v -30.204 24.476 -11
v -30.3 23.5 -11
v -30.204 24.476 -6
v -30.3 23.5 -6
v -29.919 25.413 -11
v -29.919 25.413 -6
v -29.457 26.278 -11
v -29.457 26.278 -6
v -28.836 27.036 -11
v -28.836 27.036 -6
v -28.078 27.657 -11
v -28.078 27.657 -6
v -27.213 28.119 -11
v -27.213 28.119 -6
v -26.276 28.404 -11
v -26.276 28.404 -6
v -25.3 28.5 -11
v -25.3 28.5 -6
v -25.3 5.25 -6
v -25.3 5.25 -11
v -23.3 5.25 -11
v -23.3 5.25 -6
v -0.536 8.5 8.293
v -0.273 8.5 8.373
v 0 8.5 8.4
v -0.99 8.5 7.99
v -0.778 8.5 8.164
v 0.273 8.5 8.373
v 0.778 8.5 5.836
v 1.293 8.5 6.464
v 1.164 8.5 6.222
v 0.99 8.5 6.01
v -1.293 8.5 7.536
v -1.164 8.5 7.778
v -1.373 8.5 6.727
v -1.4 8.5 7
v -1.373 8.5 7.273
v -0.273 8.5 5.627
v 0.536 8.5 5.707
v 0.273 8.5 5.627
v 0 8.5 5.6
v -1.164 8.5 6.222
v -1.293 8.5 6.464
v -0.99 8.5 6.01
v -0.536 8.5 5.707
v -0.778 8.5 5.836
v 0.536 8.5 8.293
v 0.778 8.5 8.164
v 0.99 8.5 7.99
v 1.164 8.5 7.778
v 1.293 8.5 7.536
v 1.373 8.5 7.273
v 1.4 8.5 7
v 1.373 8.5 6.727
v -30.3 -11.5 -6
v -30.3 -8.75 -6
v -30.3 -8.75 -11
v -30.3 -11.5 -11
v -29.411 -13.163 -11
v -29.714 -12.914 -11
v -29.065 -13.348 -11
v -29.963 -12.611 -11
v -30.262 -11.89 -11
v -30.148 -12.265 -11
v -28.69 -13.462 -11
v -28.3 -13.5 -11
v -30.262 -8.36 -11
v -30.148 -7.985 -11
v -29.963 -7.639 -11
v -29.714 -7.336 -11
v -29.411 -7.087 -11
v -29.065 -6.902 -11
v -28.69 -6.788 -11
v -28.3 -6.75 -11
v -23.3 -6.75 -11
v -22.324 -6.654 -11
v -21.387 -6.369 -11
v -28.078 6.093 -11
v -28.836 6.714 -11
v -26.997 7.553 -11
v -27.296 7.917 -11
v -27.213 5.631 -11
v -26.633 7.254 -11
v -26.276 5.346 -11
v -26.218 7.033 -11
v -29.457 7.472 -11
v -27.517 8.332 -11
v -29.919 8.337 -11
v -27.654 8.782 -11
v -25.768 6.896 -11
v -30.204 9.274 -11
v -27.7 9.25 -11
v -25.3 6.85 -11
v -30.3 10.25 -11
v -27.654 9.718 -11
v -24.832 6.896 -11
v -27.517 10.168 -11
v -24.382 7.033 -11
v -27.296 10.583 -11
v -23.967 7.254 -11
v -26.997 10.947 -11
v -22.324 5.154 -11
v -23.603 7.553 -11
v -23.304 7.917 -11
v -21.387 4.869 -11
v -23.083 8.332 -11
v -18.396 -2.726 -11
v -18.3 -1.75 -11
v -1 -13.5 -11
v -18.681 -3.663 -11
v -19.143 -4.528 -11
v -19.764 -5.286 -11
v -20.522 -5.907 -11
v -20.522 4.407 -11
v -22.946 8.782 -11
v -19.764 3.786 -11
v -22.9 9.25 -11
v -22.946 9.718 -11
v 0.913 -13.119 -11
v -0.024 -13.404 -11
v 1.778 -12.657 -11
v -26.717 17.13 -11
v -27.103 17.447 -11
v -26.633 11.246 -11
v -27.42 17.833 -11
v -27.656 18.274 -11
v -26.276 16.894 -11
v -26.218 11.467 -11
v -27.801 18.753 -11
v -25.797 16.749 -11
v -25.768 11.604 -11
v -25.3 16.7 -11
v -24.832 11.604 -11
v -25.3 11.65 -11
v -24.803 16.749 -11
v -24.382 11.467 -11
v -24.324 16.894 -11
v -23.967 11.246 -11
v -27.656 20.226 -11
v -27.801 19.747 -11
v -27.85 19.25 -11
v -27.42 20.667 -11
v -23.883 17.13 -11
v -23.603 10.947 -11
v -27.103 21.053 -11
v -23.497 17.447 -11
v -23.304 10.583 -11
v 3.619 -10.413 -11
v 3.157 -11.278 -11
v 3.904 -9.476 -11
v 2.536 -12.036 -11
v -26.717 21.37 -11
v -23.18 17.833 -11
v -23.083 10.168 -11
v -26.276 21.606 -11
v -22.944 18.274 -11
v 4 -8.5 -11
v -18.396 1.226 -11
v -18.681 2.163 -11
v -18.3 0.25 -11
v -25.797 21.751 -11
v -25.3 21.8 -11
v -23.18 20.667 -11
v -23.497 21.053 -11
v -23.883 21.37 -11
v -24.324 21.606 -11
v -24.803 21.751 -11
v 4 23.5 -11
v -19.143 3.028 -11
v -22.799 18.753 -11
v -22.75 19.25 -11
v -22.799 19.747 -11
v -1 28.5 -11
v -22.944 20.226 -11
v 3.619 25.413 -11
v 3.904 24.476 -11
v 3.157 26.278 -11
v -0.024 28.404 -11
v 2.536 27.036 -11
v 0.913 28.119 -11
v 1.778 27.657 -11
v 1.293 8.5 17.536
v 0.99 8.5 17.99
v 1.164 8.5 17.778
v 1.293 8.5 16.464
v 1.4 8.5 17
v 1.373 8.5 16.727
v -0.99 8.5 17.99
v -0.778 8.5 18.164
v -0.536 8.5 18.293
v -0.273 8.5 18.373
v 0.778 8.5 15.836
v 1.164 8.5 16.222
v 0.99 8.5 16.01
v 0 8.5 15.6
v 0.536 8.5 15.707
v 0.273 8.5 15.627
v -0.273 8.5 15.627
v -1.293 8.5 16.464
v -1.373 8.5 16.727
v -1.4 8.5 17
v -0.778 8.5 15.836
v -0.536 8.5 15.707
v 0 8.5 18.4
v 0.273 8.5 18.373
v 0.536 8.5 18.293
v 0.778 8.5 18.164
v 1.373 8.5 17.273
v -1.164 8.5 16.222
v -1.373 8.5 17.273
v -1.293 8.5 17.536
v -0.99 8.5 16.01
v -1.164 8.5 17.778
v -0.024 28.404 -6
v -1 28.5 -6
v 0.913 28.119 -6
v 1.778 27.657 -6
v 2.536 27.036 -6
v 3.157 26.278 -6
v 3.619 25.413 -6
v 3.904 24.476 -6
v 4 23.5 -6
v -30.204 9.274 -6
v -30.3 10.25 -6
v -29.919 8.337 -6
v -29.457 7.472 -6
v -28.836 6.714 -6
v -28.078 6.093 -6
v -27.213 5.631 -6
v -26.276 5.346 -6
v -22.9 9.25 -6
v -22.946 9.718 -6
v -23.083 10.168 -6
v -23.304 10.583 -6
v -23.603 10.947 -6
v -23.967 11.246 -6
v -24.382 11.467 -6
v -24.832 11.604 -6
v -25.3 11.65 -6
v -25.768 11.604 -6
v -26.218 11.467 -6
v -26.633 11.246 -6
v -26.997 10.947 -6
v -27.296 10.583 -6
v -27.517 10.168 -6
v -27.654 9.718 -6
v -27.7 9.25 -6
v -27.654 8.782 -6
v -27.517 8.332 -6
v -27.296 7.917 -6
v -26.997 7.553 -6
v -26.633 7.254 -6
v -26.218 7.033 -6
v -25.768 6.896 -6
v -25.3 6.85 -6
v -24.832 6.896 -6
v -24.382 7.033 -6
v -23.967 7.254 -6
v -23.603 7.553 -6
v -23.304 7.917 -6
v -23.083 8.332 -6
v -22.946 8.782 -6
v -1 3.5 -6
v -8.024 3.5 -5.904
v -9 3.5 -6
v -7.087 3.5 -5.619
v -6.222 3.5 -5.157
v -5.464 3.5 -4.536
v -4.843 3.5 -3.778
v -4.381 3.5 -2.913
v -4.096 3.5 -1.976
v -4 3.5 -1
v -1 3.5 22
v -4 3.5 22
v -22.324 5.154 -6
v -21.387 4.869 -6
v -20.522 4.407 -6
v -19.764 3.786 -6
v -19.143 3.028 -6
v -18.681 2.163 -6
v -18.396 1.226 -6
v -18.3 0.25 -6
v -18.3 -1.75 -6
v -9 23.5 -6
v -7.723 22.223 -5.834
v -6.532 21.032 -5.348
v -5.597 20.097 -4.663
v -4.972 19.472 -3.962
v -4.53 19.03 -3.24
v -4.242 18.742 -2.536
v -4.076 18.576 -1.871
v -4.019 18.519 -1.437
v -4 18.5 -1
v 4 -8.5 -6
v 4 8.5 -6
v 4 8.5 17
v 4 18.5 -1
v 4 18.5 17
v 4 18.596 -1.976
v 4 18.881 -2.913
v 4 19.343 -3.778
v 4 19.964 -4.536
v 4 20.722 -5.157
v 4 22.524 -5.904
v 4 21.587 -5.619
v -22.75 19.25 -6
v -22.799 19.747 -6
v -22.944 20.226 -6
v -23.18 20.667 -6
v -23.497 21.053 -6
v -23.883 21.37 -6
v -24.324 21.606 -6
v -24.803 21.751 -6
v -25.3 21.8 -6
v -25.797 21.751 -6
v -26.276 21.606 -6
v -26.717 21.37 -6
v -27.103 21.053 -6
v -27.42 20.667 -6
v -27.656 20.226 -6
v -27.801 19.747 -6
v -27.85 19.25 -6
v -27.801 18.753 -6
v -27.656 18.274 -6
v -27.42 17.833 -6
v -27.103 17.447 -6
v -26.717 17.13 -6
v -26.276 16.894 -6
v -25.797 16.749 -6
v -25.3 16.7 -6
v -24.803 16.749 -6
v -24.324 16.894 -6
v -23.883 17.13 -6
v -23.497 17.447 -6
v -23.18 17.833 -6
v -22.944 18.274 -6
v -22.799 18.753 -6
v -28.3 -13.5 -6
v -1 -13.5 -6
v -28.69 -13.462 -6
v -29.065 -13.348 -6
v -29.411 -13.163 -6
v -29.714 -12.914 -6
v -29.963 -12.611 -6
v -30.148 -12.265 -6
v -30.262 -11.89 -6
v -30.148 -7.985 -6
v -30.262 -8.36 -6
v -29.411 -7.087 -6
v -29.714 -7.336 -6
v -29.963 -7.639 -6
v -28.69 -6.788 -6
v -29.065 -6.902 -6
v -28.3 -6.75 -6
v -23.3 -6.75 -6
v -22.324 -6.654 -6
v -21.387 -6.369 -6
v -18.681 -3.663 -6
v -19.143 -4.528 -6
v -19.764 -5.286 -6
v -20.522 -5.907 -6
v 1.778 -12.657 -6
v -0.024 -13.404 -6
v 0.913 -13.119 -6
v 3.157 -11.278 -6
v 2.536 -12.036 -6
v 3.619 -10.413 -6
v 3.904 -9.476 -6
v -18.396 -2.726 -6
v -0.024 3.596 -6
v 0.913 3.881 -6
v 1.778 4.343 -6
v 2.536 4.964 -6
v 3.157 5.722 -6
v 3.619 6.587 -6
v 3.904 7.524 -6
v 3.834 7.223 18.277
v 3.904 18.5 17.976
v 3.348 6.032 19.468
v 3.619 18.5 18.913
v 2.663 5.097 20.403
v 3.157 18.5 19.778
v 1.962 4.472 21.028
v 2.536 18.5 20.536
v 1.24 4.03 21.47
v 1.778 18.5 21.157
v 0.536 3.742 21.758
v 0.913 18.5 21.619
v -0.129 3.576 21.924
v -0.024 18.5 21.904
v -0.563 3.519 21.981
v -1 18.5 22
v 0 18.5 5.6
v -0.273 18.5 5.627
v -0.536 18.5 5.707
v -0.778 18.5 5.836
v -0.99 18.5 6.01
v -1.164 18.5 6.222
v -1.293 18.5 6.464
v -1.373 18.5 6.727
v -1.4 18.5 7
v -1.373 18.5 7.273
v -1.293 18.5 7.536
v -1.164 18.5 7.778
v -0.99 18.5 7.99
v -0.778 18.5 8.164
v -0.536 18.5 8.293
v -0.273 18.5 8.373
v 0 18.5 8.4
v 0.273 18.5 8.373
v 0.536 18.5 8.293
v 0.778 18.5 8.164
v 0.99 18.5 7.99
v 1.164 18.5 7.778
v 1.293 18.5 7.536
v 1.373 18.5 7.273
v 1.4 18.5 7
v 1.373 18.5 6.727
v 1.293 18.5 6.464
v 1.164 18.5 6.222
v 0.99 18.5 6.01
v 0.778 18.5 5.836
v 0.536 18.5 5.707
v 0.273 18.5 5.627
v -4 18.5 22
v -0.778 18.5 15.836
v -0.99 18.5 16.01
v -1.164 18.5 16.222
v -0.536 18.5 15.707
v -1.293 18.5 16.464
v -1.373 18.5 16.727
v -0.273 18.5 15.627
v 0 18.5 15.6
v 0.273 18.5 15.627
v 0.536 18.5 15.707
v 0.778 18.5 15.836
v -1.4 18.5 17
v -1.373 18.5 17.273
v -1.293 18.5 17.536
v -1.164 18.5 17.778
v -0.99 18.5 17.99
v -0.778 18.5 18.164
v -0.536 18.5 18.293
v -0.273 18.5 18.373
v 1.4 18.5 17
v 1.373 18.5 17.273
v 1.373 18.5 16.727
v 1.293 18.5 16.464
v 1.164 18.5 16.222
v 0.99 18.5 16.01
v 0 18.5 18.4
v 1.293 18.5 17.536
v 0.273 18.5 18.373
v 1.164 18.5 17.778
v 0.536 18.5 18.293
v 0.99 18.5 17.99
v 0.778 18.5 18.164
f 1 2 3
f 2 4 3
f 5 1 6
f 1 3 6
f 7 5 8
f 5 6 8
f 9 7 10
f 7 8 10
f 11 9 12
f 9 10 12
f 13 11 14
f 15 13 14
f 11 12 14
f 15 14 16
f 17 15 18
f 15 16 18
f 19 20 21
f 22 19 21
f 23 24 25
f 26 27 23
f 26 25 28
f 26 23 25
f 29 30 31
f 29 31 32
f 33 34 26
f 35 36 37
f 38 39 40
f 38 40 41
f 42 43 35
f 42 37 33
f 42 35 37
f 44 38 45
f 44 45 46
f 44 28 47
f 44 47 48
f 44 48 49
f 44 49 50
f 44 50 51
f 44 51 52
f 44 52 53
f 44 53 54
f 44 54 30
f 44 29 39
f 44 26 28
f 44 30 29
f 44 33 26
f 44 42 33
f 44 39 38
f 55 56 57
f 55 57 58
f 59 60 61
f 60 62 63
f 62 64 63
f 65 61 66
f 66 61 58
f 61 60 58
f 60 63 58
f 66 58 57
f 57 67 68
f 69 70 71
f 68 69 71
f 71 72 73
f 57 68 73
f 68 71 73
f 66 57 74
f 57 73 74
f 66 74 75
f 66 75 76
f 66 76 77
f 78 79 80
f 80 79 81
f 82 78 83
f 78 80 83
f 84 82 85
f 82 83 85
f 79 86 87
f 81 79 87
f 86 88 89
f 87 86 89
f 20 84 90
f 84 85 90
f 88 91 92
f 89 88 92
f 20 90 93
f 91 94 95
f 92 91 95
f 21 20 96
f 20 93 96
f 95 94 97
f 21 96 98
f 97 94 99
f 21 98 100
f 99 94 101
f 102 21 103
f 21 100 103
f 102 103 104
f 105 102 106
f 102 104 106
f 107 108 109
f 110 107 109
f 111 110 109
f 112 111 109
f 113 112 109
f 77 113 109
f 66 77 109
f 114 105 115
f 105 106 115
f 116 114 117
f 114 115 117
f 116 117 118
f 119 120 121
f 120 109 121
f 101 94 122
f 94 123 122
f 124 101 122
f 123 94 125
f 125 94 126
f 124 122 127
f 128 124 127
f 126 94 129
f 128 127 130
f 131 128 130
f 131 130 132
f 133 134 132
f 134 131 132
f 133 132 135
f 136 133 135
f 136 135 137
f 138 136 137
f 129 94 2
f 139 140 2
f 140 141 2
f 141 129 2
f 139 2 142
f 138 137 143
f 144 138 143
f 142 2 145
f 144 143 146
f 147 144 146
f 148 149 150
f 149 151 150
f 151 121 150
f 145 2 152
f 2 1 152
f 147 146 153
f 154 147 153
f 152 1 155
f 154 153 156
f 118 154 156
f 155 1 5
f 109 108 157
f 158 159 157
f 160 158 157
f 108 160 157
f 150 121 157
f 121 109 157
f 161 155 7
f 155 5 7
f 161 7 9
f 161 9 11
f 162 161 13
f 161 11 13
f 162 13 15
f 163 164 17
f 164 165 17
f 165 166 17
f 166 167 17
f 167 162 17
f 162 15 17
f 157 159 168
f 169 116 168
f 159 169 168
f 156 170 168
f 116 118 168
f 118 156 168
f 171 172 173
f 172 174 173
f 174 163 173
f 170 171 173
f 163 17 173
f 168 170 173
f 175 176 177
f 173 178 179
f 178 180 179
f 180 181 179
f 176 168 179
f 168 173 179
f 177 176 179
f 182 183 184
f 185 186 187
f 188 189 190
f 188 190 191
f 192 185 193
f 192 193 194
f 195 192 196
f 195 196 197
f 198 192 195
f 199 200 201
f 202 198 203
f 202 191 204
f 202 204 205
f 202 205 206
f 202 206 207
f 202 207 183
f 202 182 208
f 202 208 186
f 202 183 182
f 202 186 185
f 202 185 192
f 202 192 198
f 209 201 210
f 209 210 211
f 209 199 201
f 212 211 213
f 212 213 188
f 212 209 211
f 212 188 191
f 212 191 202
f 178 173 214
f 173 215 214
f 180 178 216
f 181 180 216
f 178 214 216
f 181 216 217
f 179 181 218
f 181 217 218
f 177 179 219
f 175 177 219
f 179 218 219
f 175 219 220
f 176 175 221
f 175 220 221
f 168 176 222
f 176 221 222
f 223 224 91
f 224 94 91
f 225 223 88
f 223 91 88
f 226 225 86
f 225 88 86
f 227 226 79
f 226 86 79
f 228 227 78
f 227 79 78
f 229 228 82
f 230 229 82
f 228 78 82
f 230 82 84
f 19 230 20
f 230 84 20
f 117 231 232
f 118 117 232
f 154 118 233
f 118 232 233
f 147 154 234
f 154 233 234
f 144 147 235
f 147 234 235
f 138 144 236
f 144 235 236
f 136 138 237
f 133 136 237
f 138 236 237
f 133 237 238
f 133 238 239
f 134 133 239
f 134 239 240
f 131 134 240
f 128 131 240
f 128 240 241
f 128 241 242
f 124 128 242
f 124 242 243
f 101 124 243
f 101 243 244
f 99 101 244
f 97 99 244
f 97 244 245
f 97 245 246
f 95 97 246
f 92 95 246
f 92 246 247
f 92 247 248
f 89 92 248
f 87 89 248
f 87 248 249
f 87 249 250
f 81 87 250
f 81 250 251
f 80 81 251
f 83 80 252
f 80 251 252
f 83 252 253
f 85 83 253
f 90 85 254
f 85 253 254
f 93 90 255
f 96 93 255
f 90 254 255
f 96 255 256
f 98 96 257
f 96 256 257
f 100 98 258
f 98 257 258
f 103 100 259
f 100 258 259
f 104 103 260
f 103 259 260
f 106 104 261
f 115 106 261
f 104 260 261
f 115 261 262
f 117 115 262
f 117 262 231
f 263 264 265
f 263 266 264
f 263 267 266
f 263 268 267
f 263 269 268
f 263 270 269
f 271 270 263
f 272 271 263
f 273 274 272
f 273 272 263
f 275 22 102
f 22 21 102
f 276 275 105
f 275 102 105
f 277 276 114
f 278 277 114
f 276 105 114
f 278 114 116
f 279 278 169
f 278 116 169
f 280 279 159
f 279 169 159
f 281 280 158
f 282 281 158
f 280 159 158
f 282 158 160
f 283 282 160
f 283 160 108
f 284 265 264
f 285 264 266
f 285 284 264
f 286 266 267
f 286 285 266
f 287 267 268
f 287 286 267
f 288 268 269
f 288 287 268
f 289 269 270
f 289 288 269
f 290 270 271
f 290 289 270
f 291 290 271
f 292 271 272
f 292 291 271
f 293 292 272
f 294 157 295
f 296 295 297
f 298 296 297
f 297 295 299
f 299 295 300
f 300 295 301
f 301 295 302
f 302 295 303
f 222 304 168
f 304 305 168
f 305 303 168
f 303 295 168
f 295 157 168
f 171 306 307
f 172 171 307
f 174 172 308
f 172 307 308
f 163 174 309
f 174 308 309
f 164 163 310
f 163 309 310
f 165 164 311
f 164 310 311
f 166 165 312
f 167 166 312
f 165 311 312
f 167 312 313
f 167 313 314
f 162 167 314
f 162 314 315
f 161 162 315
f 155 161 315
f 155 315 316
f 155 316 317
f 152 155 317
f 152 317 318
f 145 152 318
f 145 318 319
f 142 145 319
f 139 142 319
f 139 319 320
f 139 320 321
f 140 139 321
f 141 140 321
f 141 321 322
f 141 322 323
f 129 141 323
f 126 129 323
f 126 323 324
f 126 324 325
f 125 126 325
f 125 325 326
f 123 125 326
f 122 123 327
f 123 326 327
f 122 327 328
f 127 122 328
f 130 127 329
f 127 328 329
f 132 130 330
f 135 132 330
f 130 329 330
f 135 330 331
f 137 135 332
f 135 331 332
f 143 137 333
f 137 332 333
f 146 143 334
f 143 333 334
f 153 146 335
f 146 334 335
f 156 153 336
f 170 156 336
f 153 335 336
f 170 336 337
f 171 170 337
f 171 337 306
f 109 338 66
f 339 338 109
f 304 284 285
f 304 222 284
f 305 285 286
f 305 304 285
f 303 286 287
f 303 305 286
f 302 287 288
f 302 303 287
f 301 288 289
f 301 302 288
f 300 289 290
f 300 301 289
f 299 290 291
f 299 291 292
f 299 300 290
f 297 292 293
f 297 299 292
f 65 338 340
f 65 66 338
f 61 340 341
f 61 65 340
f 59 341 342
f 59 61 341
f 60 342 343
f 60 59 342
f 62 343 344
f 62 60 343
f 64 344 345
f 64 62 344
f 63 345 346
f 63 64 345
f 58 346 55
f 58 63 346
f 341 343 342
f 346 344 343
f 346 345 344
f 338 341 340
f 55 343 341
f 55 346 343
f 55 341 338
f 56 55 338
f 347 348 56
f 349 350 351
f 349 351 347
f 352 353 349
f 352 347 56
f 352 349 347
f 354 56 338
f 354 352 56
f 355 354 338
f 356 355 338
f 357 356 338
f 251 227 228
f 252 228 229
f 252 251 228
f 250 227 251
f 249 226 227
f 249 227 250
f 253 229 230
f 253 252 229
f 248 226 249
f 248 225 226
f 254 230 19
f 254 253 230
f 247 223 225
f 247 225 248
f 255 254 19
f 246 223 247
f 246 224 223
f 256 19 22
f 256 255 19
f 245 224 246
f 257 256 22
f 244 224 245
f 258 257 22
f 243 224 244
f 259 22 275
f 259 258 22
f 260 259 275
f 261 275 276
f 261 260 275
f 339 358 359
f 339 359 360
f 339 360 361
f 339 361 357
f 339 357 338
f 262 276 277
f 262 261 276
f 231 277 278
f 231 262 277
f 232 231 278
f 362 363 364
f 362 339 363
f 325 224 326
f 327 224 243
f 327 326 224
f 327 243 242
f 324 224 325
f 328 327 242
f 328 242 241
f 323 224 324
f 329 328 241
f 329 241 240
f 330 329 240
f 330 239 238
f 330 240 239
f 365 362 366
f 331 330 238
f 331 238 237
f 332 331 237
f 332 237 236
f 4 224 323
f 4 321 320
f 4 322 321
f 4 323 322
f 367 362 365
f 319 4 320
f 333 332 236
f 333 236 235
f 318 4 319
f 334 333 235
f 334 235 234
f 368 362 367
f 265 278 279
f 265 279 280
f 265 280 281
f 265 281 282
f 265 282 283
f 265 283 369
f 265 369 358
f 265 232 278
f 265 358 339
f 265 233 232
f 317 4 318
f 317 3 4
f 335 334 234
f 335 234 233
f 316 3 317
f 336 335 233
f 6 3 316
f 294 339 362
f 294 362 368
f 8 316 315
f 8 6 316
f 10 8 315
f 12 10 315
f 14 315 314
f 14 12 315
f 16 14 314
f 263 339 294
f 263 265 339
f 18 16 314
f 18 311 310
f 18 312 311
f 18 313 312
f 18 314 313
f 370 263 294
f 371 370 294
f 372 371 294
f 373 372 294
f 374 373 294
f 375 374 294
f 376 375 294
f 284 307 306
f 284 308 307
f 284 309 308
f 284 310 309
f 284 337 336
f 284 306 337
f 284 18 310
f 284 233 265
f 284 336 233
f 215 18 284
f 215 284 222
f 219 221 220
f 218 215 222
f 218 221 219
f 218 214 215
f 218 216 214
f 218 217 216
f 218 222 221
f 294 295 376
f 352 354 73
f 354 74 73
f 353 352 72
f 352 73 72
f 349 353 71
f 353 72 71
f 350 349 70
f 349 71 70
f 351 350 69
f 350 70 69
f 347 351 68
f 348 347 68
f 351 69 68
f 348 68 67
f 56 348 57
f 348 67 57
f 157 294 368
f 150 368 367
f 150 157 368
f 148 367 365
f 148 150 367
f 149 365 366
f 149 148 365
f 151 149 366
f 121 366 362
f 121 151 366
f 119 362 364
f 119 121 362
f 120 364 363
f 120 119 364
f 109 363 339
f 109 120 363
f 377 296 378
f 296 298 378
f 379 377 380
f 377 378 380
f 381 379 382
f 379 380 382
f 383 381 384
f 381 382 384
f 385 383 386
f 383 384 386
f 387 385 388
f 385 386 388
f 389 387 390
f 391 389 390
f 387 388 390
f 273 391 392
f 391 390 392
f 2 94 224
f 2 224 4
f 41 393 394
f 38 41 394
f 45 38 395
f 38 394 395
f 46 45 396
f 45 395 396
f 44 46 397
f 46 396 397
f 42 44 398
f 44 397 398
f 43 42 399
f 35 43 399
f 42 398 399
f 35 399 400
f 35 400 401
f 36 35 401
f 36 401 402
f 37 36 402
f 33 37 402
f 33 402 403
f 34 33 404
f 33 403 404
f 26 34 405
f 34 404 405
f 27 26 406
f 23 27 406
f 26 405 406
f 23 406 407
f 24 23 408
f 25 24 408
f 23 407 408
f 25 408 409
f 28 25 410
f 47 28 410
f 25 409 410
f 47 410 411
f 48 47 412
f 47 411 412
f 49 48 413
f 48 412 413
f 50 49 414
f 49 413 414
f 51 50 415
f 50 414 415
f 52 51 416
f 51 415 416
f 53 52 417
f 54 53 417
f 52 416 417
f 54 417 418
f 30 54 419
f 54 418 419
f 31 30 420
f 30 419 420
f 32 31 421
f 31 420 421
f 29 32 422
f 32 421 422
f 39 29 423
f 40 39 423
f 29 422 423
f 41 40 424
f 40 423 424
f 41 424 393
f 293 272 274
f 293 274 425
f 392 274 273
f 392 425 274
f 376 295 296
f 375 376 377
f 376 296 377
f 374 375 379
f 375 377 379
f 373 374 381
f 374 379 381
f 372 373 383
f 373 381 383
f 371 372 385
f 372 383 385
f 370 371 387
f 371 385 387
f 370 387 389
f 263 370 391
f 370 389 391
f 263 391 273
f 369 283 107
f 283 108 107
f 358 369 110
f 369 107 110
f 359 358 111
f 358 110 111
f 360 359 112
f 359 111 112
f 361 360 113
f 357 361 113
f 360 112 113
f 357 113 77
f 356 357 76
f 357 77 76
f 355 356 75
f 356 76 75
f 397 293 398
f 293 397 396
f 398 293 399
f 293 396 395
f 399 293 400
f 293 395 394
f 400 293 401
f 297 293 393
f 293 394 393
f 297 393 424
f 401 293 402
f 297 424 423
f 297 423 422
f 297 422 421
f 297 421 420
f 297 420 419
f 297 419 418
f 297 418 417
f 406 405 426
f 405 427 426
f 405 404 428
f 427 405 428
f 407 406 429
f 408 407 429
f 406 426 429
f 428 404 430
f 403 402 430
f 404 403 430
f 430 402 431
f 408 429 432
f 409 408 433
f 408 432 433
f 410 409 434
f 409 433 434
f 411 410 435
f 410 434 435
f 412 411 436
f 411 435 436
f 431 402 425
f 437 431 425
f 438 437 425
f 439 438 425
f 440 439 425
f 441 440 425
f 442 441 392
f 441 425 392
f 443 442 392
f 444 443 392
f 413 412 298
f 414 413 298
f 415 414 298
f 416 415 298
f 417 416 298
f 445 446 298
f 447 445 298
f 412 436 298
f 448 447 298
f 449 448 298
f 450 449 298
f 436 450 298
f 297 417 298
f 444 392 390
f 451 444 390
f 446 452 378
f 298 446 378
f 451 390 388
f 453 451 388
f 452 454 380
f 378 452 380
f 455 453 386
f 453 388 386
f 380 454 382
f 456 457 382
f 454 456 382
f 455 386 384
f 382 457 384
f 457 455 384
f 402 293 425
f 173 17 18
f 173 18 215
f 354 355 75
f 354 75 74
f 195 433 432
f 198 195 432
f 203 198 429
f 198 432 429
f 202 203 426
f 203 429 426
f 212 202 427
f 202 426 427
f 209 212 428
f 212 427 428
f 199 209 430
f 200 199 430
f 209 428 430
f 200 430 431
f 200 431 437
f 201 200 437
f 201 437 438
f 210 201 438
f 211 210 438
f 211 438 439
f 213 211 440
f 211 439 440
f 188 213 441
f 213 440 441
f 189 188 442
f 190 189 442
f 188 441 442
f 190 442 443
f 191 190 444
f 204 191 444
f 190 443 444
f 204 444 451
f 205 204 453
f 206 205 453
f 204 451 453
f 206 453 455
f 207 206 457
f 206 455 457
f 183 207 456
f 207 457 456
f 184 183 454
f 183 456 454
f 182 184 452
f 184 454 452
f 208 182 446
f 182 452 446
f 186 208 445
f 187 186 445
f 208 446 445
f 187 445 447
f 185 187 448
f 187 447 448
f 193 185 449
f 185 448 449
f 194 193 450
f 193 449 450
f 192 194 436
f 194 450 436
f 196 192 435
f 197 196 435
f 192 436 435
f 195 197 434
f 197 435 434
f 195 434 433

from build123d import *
from OCP.BRepFilletAPI import BRepFilletAPI_MakeFillet

# Parameters (mm, degrees)
SKETCH1_W           = 8
SKETCH1_H           = 15
BOSS_EXTRUDE1_DEPTH = 22
CUT_EXTRUDE1_START  = 18.5
SKETCH2_R           = 1.4
CUT_EXTRUDE1_DEPTH  = 10
SKETCH3_W           = 8
SKETCH3_H           = 15
BOSS_EXTRUDE2_DEPTH = 6
BOSS_EXTRUDE3_START = -6
BOSS_EXTRUDE3_DEPTH = 5
BOSS_EXTRUDE4_START = -11
SKETCH5_W           = 34.3
SKETCH5_H           = 15
BOSS_EXTRUDE4_DEPTH = 5
SKETCH7_R           = 2.55
SKETCH7_R_2         = 2.4
CUT_EXTRUDE2_DEPTH  = 48.05677422
FILLET1_R           = 5
FILLET1_R_2         = 2


with BuildPart() as part:
    # Sketch1 → Boss-Extrude1 (new body)
    with BuildSketch(Plane.XY):
        with Locations((0, 11)):
            Rectangle(SKETCH1_W, SKETCH1_H)
    extrude(amount=BOSS_EXTRUDE1_DEPTH)

    # Sketch2 → Cut-Extrude1 (cut)
    with BuildSketch(Plane(origin=(0, 0, 0), x_dir=(1, 0, 0), z_dir=(0, 1, 0)).offset(CUT_EXTRUDE1_START)):
        with Locations(Location((0, -7, 0), (0, 0, 90))):
            Circle(SKETCH2_R)
        with Locations(Location((0, -17, 0), (0, 0, 90))):
            Circle(SKETCH2_R)
    extrude(amount=-CUT_EXTRUDE1_DEPTH, mode=Mode.SUBTRACT)

    # Sketch3 → Boss-Extrude2 (add)
    with BuildSketch(Plane.XY):
        with Locations((0, 11)):
            Rectangle(SKETCH3_W, SKETCH3_H)
    extrude(amount=-BOSS_EXTRUDE2_DEPTH)

    # Sketch4 → Boss-Extrude3 (add)
    with BuildSketch(Plane.XY.offset(BOSS_EXTRUDE3_START)):
        Polygon((-16, -13.5), (4, -13.5), (4, 13.5), (-30.3, 13.5), (-30.3, 5.25), (-18.3, 5.25), (-18.3, -6.75), (-30.3, -6.75), (-30.3, -13.5), align=None)
    extrude(amount=-BOSS_EXTRUDE3_DEPTH)

    # Sketch5 → Boss-Extrude4 (add)
    with BuildSketch(Plane.XY.offset(BOSS_EXTRUDE4_START)):
        with Locations((-13.15, 21)):
            Rectangle(SKETCH5_W, SKETCH5_H)
    extrude(amount=BOSS_EXTRUDE4_DEPTH)

    # Sketch7 → Cut-Extrude2 (cut, through all)
    with BuildSketch(Plane.XY):
        with Locations((-25.3, 19.25)):
            Circle(SKETCH7_R)
        with Locations((-25.3, 9.25)):
            Circle(SKETCH7_R_2)
    extrude(amount=-CUT_EXTRUDE2_DEPTH, mode=Mode.SUBTRACT)

    # Fillet1
    fillet1_edges_1 = [part.edges().sort_by_distance(p)[0] for p in [
        (-4, 11, -6),
        (0, 18.5, -6),
        (-18.3, -6.75, -8.5),
        (-18.3, 5.25, -8.5),
        (-30.3, 5.25, -8.5),
        (4, -13.5, -8.5),
        (4, 11, 22),
        (4, 28.5, -8.5),
        (-30.3, 28.5, -8.5),
        (4, 3.5, 8),
    ]]
    fillet1_edges_2 = [part.edges().sort_by_distance(p)[0] for p in [
        (-30.3, -6.75, -8.5),
        (-30.3, -13.5, -8.5),
    ]]
    fillet1 = BRepFilletAPI_MakeFillet(part.part.solid().wrapped)
    for e in fillet1_edges_1:
        fillet1.Add(FILLET1_R - 0.0001, e.wrapped)
    for e in fillet1_edges_2:
        fillet1.Add(FILLET1_R_2 - 0.0001, e.wrapped)
    add(Compound.cast(fillet1.Shape()), mode=Mode.REPLACE)  # a hair under: the kernel refuses the full size


solid = part.part
